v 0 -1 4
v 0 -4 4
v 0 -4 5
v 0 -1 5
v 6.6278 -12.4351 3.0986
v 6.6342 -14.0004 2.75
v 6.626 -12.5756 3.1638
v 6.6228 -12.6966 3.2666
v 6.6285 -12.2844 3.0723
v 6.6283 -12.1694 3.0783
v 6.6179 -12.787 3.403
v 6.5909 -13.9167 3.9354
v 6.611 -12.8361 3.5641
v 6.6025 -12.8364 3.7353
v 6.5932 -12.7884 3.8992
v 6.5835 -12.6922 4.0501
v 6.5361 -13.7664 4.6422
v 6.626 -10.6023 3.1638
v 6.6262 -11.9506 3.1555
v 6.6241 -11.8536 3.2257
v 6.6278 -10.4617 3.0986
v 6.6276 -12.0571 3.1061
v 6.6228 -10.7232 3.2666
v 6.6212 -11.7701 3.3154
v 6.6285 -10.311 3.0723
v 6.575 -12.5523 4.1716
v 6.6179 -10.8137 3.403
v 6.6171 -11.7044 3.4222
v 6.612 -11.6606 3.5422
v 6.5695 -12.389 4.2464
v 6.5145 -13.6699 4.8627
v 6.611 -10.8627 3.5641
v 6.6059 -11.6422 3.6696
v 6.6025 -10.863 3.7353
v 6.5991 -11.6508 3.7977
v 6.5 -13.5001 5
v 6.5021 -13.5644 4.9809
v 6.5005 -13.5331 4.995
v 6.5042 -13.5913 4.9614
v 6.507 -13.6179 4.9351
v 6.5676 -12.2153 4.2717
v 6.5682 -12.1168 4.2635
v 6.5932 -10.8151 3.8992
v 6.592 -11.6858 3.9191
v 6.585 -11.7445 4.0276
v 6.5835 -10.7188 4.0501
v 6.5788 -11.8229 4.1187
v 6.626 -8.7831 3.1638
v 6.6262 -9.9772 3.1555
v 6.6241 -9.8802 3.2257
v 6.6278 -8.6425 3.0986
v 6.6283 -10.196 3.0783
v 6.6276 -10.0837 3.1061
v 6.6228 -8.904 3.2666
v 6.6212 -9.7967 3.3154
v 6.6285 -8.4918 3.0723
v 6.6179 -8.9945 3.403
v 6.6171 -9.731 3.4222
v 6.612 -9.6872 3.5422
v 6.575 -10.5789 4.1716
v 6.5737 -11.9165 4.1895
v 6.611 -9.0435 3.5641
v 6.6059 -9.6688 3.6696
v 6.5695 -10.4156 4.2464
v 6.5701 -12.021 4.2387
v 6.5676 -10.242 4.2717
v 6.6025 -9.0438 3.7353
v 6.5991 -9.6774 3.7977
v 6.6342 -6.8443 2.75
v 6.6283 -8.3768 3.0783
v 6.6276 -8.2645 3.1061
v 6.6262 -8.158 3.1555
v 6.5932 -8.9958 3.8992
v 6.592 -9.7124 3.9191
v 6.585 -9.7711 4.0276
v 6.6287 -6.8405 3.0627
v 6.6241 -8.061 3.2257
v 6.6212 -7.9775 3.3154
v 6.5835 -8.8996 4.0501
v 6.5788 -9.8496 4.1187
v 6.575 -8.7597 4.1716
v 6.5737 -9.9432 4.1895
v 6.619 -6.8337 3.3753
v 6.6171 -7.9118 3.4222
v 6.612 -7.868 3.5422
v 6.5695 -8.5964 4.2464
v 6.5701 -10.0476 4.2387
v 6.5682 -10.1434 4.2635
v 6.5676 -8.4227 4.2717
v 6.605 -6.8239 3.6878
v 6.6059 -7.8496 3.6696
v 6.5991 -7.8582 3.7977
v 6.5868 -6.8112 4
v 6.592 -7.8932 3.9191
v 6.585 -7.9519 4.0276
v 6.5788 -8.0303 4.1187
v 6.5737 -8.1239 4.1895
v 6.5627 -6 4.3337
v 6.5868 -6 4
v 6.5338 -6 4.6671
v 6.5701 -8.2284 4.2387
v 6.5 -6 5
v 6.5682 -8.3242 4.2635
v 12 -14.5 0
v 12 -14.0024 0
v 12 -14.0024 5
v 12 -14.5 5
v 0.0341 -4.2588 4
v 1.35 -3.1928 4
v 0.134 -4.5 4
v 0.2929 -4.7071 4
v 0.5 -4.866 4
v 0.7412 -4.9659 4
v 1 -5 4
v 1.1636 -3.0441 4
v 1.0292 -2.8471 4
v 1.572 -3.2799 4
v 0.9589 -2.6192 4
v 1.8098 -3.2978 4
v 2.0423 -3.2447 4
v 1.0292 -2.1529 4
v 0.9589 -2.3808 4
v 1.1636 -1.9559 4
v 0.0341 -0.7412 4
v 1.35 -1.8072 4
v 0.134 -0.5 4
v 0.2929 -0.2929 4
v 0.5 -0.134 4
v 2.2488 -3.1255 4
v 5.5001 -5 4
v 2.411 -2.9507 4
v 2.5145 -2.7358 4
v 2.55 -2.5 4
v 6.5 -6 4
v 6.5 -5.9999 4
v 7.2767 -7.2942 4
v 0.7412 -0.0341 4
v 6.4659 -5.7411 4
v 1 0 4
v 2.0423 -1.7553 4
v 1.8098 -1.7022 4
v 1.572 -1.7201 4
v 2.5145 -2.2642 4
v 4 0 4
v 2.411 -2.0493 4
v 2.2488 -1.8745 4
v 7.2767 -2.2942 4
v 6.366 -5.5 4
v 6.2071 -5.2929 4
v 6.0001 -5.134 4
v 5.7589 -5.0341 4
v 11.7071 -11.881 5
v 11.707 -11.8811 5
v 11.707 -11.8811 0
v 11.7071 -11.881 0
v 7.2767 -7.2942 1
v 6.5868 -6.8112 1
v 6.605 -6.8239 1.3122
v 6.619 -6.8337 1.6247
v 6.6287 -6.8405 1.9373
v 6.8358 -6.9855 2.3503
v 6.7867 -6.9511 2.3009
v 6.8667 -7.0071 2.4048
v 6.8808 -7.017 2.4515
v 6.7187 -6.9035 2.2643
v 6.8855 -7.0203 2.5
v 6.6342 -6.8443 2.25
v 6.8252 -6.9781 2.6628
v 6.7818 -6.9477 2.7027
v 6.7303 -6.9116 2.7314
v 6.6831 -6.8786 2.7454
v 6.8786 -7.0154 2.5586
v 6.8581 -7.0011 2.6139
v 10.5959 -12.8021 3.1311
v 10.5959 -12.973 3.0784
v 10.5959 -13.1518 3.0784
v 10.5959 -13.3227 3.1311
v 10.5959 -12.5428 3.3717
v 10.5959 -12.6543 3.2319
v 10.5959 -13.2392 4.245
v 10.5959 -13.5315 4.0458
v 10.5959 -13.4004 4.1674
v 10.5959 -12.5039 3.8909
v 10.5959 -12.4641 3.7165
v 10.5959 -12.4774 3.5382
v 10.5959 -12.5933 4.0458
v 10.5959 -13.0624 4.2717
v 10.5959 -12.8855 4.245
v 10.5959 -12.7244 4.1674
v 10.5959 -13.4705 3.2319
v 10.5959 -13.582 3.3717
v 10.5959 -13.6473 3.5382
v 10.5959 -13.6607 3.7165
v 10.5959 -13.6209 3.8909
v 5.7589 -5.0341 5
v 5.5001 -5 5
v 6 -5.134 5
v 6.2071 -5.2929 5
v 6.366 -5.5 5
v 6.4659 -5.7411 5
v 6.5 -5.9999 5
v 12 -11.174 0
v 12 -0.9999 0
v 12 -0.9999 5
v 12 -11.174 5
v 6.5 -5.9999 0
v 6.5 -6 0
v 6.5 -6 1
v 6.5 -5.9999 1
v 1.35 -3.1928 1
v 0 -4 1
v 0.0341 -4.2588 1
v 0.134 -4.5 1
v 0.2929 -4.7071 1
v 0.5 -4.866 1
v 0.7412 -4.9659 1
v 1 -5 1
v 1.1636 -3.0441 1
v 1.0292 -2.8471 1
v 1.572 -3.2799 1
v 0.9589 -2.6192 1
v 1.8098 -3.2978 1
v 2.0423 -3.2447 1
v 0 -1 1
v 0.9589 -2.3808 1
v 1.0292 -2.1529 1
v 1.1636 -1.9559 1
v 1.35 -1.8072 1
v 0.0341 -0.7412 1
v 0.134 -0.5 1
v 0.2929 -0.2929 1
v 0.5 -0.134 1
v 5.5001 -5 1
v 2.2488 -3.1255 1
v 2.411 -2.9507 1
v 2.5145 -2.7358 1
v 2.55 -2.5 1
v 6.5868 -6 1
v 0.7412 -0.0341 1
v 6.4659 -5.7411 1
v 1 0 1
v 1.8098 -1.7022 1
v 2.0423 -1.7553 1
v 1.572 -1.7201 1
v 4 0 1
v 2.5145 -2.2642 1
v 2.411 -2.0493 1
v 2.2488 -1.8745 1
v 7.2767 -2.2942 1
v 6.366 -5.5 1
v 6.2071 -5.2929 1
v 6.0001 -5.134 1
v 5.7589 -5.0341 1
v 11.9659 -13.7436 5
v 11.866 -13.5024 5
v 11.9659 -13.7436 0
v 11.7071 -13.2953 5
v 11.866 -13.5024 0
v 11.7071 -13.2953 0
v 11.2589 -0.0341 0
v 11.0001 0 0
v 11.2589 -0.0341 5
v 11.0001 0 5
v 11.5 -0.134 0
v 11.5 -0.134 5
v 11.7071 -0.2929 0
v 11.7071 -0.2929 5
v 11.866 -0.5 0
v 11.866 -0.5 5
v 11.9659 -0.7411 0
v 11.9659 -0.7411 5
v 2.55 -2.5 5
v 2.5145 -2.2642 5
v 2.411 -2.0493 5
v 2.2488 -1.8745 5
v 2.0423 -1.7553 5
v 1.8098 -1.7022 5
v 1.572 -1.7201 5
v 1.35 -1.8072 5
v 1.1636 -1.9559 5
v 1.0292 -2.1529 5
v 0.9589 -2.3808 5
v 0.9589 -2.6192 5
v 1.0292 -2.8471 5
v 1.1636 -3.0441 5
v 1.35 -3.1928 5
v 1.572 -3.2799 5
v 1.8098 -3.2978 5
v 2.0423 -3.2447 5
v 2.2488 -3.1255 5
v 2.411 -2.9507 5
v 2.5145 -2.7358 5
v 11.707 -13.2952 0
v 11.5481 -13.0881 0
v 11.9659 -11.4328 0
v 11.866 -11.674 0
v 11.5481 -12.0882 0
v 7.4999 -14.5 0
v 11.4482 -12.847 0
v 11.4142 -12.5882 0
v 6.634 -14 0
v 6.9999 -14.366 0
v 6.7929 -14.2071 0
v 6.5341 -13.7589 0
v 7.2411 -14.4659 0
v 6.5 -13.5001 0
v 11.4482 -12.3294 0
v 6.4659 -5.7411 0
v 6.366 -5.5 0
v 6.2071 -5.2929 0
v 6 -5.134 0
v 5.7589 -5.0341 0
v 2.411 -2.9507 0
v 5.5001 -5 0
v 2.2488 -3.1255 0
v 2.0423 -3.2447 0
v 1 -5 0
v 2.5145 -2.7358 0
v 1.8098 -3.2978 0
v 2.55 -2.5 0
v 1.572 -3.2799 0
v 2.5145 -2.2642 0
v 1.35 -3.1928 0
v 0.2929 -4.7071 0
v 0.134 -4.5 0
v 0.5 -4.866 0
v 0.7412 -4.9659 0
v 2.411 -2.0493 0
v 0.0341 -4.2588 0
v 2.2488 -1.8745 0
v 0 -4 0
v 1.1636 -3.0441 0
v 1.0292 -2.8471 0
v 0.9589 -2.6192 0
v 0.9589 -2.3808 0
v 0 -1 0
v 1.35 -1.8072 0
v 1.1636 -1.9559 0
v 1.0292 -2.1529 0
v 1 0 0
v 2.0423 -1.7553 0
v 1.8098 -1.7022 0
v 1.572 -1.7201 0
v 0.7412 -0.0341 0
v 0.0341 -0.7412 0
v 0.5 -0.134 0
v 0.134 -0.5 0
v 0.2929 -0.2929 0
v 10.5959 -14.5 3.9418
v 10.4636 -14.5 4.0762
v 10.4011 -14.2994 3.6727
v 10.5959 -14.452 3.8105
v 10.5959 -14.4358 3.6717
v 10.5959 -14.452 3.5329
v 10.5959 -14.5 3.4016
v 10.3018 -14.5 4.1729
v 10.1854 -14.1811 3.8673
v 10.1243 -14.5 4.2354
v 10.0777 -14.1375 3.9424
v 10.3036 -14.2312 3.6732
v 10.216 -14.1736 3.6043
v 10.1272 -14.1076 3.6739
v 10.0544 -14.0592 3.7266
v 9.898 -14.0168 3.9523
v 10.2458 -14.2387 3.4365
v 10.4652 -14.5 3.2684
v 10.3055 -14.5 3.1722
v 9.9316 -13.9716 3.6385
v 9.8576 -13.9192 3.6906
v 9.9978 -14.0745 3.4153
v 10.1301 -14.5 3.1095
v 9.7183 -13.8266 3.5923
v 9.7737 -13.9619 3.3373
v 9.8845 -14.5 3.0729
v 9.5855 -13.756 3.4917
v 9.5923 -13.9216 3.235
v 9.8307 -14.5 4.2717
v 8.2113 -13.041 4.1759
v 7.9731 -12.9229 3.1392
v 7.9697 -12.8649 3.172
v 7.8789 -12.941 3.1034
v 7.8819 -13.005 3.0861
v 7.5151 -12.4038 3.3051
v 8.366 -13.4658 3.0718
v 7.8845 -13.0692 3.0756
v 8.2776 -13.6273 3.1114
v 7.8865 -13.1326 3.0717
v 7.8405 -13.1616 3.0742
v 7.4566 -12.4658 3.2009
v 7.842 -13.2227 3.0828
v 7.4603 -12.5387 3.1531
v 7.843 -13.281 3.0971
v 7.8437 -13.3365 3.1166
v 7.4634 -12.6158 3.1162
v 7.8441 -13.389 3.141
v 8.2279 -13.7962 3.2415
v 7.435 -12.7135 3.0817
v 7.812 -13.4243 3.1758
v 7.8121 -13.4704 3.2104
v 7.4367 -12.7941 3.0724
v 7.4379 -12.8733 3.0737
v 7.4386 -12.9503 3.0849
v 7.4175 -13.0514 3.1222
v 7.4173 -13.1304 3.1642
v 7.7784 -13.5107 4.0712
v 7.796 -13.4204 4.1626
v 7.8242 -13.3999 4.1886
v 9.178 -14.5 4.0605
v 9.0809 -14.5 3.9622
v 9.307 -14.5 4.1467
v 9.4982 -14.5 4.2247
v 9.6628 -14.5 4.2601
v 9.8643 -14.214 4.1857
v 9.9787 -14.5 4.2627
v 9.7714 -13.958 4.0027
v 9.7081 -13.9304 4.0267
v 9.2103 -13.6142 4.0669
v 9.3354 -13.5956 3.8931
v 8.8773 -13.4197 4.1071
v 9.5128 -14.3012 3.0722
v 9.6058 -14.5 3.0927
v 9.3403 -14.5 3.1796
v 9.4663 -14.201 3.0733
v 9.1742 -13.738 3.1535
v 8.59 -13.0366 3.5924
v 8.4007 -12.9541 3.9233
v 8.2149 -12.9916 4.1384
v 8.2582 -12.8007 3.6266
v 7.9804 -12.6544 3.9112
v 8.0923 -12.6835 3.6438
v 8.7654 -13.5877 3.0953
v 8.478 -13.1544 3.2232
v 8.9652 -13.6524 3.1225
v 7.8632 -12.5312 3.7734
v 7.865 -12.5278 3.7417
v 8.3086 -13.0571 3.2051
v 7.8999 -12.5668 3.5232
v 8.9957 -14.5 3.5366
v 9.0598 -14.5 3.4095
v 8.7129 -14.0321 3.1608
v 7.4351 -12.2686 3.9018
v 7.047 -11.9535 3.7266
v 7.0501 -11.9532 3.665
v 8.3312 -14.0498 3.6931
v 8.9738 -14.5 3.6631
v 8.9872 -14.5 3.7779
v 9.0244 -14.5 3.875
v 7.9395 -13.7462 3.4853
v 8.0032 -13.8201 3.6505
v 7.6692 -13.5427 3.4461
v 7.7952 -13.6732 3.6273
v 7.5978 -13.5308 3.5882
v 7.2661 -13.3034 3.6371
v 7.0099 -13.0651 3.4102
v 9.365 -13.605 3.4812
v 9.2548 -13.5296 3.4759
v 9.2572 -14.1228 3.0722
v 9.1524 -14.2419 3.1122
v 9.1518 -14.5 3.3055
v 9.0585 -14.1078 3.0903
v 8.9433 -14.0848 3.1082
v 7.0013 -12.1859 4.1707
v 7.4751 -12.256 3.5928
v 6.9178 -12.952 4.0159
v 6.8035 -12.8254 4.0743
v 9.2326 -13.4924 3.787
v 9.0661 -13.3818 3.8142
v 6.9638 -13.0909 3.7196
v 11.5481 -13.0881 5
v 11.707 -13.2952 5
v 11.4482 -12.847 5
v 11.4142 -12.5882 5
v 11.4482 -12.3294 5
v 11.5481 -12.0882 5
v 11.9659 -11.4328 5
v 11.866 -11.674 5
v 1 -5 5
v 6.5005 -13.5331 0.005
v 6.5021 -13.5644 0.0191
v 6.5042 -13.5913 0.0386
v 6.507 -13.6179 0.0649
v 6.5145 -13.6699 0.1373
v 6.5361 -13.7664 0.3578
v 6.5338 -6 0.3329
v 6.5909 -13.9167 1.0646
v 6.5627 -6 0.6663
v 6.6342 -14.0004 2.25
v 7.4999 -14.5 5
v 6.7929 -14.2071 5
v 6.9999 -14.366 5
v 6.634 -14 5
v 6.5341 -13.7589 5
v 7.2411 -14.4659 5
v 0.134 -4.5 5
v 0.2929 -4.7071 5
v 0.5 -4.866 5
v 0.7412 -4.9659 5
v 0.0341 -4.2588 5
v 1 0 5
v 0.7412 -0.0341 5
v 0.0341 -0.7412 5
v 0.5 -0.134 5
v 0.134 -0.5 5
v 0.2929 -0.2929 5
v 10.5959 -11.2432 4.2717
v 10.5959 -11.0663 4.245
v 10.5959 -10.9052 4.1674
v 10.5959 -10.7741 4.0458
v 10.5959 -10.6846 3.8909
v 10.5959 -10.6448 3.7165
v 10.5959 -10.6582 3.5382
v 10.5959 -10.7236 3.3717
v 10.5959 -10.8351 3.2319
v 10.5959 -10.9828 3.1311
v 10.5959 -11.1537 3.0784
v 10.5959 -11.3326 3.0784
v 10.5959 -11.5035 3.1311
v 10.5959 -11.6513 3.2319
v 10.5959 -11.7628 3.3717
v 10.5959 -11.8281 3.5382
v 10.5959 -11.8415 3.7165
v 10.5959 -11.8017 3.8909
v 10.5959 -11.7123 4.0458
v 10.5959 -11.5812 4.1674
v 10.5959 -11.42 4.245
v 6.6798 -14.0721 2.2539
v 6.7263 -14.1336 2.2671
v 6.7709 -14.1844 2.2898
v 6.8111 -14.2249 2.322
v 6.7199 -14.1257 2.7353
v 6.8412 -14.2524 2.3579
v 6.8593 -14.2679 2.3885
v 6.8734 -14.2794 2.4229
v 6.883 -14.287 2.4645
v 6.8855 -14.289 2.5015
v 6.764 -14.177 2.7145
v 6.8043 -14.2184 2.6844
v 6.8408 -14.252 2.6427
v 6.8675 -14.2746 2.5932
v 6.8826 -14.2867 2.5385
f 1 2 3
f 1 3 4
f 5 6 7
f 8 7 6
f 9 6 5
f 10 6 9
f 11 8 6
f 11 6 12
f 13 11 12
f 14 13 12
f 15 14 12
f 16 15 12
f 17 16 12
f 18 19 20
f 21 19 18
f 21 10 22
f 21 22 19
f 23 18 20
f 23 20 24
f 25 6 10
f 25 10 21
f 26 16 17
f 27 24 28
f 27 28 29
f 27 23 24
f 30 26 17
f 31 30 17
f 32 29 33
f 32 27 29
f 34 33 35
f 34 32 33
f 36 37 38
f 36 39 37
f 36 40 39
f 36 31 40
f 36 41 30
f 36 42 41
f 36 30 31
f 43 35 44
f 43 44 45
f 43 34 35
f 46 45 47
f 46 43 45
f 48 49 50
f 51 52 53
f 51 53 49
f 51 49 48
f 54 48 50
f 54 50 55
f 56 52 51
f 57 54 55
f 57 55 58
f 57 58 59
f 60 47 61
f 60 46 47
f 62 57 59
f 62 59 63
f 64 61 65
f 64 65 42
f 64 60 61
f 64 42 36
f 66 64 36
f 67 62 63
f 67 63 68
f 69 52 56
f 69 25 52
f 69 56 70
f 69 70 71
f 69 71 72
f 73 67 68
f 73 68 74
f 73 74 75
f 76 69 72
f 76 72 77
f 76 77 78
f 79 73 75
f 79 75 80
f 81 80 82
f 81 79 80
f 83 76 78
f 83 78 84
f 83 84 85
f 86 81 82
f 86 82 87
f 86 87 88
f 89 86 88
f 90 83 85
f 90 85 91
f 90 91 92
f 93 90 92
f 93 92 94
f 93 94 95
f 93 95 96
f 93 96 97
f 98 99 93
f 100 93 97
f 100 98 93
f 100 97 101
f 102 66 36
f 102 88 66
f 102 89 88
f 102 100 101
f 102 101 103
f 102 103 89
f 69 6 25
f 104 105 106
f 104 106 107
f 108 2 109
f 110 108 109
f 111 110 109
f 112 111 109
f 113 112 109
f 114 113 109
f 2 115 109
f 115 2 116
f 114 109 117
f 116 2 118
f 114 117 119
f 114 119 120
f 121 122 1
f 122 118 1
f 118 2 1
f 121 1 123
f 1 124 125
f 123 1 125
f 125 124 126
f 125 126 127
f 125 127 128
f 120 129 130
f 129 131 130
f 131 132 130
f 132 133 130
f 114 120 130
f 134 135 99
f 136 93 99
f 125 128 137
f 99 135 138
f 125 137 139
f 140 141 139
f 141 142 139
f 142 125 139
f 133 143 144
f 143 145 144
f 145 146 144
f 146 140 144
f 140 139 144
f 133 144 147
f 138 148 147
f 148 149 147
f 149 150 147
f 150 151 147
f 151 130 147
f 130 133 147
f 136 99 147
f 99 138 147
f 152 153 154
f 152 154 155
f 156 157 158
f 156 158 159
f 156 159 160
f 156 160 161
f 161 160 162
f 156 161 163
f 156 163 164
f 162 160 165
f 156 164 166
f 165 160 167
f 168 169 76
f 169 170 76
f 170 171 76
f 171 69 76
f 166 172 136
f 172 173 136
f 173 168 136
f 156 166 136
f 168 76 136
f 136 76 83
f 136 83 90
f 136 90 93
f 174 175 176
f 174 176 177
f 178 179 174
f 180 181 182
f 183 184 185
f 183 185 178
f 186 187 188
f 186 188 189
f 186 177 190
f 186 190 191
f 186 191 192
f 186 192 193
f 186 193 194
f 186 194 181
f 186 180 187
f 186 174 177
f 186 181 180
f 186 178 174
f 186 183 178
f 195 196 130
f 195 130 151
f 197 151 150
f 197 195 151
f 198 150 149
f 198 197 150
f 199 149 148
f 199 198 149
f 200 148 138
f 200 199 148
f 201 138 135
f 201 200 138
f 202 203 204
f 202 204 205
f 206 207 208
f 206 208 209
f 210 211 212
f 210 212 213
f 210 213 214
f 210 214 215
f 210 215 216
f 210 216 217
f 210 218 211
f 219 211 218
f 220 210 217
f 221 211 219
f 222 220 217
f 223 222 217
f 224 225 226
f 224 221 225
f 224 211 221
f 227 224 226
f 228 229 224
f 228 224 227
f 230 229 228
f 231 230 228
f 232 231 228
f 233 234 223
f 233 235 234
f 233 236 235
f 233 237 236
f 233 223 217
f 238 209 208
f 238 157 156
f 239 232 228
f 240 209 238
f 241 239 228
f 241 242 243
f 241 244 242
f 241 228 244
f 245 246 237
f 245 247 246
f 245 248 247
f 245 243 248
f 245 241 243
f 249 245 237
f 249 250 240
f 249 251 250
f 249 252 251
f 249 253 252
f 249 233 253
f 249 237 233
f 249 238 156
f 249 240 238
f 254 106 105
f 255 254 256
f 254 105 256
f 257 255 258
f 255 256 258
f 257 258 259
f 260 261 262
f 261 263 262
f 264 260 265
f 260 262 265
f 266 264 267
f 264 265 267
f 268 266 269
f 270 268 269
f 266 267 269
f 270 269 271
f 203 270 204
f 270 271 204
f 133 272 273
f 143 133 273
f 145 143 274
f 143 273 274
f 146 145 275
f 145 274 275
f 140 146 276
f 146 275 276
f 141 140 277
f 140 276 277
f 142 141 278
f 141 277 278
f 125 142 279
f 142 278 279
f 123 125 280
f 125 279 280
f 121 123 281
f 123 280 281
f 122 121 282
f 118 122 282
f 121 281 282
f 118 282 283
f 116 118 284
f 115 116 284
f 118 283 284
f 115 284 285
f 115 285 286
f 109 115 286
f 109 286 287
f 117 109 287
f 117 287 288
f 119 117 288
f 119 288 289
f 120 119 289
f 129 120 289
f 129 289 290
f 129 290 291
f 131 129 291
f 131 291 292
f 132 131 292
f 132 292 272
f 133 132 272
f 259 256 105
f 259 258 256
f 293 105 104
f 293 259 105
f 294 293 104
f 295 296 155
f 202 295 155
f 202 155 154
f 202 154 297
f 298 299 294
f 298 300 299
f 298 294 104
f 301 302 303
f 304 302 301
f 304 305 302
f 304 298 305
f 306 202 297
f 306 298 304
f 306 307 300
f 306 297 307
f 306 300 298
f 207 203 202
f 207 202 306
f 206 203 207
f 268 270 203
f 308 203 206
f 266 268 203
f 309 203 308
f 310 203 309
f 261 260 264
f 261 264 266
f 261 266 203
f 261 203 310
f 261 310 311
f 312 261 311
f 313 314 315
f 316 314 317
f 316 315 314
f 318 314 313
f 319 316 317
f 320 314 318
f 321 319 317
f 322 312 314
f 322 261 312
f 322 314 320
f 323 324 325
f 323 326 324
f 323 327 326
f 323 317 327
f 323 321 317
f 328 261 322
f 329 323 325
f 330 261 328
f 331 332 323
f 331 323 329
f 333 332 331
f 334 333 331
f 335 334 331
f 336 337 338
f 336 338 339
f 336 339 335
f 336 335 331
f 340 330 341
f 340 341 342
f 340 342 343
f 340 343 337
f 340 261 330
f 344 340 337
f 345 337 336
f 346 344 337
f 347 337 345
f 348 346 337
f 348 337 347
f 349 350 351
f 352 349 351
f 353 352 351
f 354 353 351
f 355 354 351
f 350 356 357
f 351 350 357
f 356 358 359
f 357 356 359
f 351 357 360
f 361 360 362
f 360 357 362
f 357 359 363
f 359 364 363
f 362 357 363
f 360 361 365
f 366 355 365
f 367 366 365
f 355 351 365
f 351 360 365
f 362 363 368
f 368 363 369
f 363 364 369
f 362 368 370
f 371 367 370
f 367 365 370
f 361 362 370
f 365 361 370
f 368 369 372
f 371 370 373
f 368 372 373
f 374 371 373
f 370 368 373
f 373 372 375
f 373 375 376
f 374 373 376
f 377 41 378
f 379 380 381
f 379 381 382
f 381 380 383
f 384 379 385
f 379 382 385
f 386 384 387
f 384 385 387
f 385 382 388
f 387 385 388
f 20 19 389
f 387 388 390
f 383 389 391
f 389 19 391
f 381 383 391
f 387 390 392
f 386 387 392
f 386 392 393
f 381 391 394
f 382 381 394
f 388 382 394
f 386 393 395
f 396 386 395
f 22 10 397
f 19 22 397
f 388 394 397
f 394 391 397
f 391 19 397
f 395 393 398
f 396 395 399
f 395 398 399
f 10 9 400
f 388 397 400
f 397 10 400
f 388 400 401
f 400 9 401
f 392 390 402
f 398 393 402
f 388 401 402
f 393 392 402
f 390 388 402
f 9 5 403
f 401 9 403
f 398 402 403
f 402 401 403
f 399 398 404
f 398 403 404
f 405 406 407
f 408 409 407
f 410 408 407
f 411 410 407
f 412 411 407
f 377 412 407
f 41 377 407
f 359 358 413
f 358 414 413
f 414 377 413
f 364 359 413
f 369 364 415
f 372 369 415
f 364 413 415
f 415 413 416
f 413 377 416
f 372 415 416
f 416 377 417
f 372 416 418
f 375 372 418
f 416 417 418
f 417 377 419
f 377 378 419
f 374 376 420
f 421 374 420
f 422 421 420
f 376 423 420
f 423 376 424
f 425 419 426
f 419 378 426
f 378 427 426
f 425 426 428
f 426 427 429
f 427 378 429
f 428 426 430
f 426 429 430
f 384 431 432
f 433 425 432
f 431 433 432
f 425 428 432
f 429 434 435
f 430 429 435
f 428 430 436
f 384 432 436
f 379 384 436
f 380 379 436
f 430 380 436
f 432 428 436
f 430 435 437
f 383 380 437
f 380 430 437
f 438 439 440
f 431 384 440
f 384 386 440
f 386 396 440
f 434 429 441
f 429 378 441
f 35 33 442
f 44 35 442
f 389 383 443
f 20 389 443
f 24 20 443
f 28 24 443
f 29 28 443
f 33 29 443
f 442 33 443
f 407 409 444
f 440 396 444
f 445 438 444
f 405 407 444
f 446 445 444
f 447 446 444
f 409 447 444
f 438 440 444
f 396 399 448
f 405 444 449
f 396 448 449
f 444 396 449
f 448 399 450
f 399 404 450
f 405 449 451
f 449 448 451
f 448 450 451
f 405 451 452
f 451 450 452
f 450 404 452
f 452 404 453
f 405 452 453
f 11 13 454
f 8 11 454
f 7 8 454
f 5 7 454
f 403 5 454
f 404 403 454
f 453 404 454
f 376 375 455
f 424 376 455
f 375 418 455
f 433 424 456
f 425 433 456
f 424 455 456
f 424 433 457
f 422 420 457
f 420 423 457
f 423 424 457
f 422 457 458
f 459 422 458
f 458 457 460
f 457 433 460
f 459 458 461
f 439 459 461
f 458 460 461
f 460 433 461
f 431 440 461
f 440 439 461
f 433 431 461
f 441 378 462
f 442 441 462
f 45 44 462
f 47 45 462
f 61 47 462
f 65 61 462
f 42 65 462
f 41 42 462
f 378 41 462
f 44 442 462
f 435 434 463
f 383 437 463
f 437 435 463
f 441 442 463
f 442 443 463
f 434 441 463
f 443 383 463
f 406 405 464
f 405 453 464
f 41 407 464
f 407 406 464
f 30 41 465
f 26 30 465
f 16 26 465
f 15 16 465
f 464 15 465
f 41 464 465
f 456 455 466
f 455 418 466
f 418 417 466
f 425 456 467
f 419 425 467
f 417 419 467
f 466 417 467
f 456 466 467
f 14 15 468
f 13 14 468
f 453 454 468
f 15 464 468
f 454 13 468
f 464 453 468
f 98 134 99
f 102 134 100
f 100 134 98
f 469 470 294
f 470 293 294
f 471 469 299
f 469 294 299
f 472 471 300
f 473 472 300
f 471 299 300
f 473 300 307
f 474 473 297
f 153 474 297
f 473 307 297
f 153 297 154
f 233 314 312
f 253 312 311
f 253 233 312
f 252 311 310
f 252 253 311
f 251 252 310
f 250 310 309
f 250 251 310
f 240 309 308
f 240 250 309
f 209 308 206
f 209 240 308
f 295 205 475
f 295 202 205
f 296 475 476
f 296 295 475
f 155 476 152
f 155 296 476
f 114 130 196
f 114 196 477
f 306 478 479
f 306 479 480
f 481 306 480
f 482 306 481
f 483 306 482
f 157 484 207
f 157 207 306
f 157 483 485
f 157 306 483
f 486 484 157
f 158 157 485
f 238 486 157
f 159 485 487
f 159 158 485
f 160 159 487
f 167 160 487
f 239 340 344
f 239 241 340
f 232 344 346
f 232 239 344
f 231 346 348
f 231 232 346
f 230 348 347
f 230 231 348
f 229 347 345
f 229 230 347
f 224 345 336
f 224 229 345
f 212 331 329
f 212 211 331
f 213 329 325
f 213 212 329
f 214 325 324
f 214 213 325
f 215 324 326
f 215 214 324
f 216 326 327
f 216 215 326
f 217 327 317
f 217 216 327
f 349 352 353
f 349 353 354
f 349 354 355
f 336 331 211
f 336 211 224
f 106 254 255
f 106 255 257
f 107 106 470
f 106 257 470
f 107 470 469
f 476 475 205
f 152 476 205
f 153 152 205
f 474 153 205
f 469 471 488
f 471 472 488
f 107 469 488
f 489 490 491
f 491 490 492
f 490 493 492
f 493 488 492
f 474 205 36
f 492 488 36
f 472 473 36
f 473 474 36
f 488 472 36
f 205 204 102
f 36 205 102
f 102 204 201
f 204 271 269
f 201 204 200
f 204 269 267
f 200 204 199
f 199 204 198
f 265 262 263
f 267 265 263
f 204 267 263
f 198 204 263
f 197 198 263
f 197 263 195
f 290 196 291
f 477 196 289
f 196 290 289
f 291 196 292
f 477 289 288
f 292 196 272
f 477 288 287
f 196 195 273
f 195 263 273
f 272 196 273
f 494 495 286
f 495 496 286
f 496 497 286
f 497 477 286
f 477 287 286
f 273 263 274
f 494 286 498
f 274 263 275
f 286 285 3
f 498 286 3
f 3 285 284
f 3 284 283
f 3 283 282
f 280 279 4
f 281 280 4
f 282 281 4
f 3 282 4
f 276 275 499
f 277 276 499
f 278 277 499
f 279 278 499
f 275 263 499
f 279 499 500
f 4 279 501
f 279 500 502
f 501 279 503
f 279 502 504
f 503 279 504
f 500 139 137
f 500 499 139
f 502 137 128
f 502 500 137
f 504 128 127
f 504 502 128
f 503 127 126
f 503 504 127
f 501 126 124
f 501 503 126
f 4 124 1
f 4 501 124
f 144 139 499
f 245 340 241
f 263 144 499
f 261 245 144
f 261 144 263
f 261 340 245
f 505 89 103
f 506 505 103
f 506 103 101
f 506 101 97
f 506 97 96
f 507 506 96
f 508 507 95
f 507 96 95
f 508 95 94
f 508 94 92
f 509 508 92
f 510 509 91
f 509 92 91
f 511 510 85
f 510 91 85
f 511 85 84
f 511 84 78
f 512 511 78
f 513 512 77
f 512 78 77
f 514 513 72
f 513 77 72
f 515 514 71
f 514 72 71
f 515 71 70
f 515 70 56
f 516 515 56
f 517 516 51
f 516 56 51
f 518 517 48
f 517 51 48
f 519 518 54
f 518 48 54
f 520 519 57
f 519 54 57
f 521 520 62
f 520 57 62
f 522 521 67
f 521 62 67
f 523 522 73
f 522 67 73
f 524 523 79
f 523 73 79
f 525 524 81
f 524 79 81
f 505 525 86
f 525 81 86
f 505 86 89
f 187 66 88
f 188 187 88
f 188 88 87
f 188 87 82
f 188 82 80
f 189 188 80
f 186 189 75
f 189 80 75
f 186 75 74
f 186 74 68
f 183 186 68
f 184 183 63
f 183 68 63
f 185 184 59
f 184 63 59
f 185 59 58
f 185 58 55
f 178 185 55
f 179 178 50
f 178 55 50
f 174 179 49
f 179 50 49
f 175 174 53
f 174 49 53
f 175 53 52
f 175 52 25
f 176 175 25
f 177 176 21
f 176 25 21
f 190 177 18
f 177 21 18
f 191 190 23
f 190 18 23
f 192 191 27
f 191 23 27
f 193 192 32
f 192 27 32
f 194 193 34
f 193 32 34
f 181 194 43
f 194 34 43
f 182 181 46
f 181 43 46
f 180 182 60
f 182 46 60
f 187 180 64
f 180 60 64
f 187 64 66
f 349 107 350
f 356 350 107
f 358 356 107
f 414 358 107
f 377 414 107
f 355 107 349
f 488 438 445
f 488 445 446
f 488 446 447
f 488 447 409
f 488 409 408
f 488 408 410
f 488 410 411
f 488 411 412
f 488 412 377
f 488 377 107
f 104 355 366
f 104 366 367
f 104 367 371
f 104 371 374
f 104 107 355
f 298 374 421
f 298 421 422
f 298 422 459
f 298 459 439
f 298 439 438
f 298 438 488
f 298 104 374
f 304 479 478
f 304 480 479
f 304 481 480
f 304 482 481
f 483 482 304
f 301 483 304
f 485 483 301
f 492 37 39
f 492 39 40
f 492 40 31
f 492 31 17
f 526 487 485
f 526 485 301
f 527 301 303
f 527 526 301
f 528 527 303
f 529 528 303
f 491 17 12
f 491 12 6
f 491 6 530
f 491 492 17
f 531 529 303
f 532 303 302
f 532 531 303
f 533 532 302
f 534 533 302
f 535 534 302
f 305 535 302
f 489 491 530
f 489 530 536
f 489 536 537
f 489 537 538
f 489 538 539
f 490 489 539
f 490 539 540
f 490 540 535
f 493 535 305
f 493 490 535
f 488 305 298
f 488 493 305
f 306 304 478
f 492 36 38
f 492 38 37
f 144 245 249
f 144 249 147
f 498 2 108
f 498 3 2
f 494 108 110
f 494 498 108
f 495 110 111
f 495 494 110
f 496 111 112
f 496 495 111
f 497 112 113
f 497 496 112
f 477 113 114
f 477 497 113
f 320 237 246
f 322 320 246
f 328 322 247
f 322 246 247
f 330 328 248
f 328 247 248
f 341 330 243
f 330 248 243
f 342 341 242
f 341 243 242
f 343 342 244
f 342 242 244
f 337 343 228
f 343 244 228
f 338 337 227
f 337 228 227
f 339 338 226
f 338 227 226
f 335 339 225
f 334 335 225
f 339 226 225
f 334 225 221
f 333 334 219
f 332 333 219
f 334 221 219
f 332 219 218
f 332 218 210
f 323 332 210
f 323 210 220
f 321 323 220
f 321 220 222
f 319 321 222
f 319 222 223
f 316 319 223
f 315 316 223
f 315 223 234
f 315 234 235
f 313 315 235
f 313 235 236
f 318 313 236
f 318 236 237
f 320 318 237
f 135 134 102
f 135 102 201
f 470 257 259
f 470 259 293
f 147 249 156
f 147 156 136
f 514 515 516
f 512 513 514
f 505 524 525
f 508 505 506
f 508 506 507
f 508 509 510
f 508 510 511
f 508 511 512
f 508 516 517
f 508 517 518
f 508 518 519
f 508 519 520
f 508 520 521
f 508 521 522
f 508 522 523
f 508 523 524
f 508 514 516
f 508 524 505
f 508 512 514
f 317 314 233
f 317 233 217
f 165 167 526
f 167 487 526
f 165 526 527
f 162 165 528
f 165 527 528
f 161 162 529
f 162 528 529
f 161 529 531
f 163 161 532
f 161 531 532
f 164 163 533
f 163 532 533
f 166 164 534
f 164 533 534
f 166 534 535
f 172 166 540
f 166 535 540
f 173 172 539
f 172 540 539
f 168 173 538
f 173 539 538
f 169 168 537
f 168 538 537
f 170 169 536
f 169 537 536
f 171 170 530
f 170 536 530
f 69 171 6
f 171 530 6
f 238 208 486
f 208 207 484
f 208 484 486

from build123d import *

# Parameters (mm, degrees)
BOSS_EXTRUDE1_DEPTH = 5
SKETCH4_R           = 0.8
CUT_EXTRUDE3_DEPTH  = 20.474342094
SKETCH5_W           = 4
SKETCH5_H           = 3
CUT_EXTRUDE4_DEPTH  = 13
FILLET4_R           = 1
CUT_EXTRUDE5_DEPTH  = 20.474342094
FILLET6_R           = 1
CUT_EXTRUDE6_START  = -8.5
CUT_EXTRUDE6_DEPTH  = 8.002697112
SKETCH11_W          = 3
SKETCH11_H          = 5
CUT_EXTRUDE8_DEPTH  = 4
SKETCH12_R          = 0.6
CUT_EXTRUDE9_DEPTH  = 5
CUT_EXTRUDE10_REACH = 21.474
SKETCH9_R           = 0.25


# Read off the part's stored shape, not the designer's step: Cut-Extrude6
with BuildPart() as part:
    # Sketch1 → Boss-Extrude1 (new body)
    with BuildSketch(Plane.XY):
        Polygon((0, 0), (12, 0), (12, -14.5), (6.5, -14.5), (6.5, -5), (0, -5), align=None)
    extrude(amount=BOSS_EXTRUDE1_DEPTH)

    # Sketch4 → Cut-Extrude3 (cut, through all)
    with BuildSketch(Plane.XY.offset(5)):
        with Locations((1.75, -2.5)):
            Circle(SKETCH4_R)
    extrude(amount=-CUT_EXTRUDE3_DEPTH, mode=Mode.SUBTRACT)

    # Sketch5 → Cut-Extrude4 (cut)
    with BuildSketch(Plane(origin=(0, 0, 0), x_dir=(1, 0, 0), z_dir=(0, 1, 0))):
        with Locations((2, -2.5)):
            Rectangle(SKETCH5_W, SKETCH5_H)
    extrude(amount=-CUT_EXTRUDE4_DEPTH, mode=Mode.SUBTRACT)

    # Fillet4
    fillet4_edges = [part.edges().sort_by_distance(p)[0] for p in [
        (0, 0, 4.5),
        (0, -5, 4.5),
        (0, 0, 0.5),
        (0, -5, 0.5),
    ]]
    fillet(fillet4_edges, radius=FILLET4_R)

    # Sketch6 → Cut-Extrude5 (cut, through all)
    with BuildSketch(Plane.XY.offset(5)):
        Polygon((12, -13.588182425), (11, -12.588182425), (12, -11.588182425), align=None)
    extrude(amount=-CUT_EXTRUDE5_DEPTH, mode=Mode.SUBTRACT)

    # Fillet6
    fillet6_edges = [part.edges().sort_by_distance(p)[0] for p in [
        (11, -12.588182425, 2.5),
        (12, -13.588182425, 2.5),
        (12, -11.588182425, 2.5),
        (6.5, -5, 2.5),
        (6.5, -14.5, 2.5),
        (12, 0, 2.5),
    ]]
    fillet(fillet6_edges, radius=FILLET6_R - 0.0001)  # a hair under: the kernel refuses the full size

    # Cut-Extrude6 outline → Cut-Extrude6 (cut)
    with BuildSketch(Plane.XZ.offset(14.5).offset(CUT_EXTRUDE6_START)):
        with BuildLine():
            Line((6.49999436, 5.000051867), (6.499994078, -5.446e-05))
            ThreePointArc((6.499994078, -5.446e-05), (6.635532303, 2.499998696), (6.49999436, 5.000051867))
        make_face()
    extrude(amount=CUT_EXTRUDE6_DEPTH, mode=Mode.SUBTRACT)

    # Sketch11 → Cut-Extrude8 (cut, along a direction that is not the sketch's normal)
    with BuildSketch(Plane.ZY.offset(-4)):
        with Locations((2.5, -2.5)):
            Rectangle(SKETCH11_W, SKETCH11_H)
    extrude(amount=-CUT_EXTRUDE8_DEPTH, dir=(-0.8191736087025463, 0.5735456379445732, 0), mode=Mode.SUBTRACT)

    # Sketch12 → Cut-Extrude9 (cut, along a direction that is not the sketch's normal)
    with BuildSketch(Plane.ZY.offset(-6.5)):
        with Locations((3.671694189, -8.375443102)):
            Circle(SKETCH12_R)
        with Locations((3.671694189, -10.194652501)):
            Circle(SKETCH12_R)
        with Locations((3.671694189, -12.168032187)):
            Circle(SKETCH12_R)
    extrude(amount=-CUT_EXTRUDE9_DEPTH, dir=(-0.8191736087025463, 0.5735456379445732, 0), mode=Mode.SUBTRACT)

    # Cut-Extrude10: up to this plane
    cut_extrude10_end = Plane(origin=(7.276694435, -7.294182552, 1), z_dir=(-0.5735456379445732, -0.8191736087025463, 0))
    # Sketch9 → Cut-Extrude10 (cut, up to the surface)
    with BuildSketch(Plane.XZ.offset(14.5), mode=Mode.PRIVATE) as cut_extrude10_sk1:
        with Locations((6.635532303, 2.5)):
            Circle(SKETCH9_R)
    cut_extrude10_tool1 = split(extrude(cut_extrude10_sk1.sketch, amount=-CUT_EXTRUDE10_REACH, mode=Mode.PRIVATE), bisect_by=cut_extrude10_end, keep=Keep.BOTH, mode=Mode.PRIVATE)
    add(cut_extrude10_tool1.solids().sort_by_distance((6.635532, -14.5, 2.5))[0], mode=Mode.SUBTRACT)


solid = part.part
